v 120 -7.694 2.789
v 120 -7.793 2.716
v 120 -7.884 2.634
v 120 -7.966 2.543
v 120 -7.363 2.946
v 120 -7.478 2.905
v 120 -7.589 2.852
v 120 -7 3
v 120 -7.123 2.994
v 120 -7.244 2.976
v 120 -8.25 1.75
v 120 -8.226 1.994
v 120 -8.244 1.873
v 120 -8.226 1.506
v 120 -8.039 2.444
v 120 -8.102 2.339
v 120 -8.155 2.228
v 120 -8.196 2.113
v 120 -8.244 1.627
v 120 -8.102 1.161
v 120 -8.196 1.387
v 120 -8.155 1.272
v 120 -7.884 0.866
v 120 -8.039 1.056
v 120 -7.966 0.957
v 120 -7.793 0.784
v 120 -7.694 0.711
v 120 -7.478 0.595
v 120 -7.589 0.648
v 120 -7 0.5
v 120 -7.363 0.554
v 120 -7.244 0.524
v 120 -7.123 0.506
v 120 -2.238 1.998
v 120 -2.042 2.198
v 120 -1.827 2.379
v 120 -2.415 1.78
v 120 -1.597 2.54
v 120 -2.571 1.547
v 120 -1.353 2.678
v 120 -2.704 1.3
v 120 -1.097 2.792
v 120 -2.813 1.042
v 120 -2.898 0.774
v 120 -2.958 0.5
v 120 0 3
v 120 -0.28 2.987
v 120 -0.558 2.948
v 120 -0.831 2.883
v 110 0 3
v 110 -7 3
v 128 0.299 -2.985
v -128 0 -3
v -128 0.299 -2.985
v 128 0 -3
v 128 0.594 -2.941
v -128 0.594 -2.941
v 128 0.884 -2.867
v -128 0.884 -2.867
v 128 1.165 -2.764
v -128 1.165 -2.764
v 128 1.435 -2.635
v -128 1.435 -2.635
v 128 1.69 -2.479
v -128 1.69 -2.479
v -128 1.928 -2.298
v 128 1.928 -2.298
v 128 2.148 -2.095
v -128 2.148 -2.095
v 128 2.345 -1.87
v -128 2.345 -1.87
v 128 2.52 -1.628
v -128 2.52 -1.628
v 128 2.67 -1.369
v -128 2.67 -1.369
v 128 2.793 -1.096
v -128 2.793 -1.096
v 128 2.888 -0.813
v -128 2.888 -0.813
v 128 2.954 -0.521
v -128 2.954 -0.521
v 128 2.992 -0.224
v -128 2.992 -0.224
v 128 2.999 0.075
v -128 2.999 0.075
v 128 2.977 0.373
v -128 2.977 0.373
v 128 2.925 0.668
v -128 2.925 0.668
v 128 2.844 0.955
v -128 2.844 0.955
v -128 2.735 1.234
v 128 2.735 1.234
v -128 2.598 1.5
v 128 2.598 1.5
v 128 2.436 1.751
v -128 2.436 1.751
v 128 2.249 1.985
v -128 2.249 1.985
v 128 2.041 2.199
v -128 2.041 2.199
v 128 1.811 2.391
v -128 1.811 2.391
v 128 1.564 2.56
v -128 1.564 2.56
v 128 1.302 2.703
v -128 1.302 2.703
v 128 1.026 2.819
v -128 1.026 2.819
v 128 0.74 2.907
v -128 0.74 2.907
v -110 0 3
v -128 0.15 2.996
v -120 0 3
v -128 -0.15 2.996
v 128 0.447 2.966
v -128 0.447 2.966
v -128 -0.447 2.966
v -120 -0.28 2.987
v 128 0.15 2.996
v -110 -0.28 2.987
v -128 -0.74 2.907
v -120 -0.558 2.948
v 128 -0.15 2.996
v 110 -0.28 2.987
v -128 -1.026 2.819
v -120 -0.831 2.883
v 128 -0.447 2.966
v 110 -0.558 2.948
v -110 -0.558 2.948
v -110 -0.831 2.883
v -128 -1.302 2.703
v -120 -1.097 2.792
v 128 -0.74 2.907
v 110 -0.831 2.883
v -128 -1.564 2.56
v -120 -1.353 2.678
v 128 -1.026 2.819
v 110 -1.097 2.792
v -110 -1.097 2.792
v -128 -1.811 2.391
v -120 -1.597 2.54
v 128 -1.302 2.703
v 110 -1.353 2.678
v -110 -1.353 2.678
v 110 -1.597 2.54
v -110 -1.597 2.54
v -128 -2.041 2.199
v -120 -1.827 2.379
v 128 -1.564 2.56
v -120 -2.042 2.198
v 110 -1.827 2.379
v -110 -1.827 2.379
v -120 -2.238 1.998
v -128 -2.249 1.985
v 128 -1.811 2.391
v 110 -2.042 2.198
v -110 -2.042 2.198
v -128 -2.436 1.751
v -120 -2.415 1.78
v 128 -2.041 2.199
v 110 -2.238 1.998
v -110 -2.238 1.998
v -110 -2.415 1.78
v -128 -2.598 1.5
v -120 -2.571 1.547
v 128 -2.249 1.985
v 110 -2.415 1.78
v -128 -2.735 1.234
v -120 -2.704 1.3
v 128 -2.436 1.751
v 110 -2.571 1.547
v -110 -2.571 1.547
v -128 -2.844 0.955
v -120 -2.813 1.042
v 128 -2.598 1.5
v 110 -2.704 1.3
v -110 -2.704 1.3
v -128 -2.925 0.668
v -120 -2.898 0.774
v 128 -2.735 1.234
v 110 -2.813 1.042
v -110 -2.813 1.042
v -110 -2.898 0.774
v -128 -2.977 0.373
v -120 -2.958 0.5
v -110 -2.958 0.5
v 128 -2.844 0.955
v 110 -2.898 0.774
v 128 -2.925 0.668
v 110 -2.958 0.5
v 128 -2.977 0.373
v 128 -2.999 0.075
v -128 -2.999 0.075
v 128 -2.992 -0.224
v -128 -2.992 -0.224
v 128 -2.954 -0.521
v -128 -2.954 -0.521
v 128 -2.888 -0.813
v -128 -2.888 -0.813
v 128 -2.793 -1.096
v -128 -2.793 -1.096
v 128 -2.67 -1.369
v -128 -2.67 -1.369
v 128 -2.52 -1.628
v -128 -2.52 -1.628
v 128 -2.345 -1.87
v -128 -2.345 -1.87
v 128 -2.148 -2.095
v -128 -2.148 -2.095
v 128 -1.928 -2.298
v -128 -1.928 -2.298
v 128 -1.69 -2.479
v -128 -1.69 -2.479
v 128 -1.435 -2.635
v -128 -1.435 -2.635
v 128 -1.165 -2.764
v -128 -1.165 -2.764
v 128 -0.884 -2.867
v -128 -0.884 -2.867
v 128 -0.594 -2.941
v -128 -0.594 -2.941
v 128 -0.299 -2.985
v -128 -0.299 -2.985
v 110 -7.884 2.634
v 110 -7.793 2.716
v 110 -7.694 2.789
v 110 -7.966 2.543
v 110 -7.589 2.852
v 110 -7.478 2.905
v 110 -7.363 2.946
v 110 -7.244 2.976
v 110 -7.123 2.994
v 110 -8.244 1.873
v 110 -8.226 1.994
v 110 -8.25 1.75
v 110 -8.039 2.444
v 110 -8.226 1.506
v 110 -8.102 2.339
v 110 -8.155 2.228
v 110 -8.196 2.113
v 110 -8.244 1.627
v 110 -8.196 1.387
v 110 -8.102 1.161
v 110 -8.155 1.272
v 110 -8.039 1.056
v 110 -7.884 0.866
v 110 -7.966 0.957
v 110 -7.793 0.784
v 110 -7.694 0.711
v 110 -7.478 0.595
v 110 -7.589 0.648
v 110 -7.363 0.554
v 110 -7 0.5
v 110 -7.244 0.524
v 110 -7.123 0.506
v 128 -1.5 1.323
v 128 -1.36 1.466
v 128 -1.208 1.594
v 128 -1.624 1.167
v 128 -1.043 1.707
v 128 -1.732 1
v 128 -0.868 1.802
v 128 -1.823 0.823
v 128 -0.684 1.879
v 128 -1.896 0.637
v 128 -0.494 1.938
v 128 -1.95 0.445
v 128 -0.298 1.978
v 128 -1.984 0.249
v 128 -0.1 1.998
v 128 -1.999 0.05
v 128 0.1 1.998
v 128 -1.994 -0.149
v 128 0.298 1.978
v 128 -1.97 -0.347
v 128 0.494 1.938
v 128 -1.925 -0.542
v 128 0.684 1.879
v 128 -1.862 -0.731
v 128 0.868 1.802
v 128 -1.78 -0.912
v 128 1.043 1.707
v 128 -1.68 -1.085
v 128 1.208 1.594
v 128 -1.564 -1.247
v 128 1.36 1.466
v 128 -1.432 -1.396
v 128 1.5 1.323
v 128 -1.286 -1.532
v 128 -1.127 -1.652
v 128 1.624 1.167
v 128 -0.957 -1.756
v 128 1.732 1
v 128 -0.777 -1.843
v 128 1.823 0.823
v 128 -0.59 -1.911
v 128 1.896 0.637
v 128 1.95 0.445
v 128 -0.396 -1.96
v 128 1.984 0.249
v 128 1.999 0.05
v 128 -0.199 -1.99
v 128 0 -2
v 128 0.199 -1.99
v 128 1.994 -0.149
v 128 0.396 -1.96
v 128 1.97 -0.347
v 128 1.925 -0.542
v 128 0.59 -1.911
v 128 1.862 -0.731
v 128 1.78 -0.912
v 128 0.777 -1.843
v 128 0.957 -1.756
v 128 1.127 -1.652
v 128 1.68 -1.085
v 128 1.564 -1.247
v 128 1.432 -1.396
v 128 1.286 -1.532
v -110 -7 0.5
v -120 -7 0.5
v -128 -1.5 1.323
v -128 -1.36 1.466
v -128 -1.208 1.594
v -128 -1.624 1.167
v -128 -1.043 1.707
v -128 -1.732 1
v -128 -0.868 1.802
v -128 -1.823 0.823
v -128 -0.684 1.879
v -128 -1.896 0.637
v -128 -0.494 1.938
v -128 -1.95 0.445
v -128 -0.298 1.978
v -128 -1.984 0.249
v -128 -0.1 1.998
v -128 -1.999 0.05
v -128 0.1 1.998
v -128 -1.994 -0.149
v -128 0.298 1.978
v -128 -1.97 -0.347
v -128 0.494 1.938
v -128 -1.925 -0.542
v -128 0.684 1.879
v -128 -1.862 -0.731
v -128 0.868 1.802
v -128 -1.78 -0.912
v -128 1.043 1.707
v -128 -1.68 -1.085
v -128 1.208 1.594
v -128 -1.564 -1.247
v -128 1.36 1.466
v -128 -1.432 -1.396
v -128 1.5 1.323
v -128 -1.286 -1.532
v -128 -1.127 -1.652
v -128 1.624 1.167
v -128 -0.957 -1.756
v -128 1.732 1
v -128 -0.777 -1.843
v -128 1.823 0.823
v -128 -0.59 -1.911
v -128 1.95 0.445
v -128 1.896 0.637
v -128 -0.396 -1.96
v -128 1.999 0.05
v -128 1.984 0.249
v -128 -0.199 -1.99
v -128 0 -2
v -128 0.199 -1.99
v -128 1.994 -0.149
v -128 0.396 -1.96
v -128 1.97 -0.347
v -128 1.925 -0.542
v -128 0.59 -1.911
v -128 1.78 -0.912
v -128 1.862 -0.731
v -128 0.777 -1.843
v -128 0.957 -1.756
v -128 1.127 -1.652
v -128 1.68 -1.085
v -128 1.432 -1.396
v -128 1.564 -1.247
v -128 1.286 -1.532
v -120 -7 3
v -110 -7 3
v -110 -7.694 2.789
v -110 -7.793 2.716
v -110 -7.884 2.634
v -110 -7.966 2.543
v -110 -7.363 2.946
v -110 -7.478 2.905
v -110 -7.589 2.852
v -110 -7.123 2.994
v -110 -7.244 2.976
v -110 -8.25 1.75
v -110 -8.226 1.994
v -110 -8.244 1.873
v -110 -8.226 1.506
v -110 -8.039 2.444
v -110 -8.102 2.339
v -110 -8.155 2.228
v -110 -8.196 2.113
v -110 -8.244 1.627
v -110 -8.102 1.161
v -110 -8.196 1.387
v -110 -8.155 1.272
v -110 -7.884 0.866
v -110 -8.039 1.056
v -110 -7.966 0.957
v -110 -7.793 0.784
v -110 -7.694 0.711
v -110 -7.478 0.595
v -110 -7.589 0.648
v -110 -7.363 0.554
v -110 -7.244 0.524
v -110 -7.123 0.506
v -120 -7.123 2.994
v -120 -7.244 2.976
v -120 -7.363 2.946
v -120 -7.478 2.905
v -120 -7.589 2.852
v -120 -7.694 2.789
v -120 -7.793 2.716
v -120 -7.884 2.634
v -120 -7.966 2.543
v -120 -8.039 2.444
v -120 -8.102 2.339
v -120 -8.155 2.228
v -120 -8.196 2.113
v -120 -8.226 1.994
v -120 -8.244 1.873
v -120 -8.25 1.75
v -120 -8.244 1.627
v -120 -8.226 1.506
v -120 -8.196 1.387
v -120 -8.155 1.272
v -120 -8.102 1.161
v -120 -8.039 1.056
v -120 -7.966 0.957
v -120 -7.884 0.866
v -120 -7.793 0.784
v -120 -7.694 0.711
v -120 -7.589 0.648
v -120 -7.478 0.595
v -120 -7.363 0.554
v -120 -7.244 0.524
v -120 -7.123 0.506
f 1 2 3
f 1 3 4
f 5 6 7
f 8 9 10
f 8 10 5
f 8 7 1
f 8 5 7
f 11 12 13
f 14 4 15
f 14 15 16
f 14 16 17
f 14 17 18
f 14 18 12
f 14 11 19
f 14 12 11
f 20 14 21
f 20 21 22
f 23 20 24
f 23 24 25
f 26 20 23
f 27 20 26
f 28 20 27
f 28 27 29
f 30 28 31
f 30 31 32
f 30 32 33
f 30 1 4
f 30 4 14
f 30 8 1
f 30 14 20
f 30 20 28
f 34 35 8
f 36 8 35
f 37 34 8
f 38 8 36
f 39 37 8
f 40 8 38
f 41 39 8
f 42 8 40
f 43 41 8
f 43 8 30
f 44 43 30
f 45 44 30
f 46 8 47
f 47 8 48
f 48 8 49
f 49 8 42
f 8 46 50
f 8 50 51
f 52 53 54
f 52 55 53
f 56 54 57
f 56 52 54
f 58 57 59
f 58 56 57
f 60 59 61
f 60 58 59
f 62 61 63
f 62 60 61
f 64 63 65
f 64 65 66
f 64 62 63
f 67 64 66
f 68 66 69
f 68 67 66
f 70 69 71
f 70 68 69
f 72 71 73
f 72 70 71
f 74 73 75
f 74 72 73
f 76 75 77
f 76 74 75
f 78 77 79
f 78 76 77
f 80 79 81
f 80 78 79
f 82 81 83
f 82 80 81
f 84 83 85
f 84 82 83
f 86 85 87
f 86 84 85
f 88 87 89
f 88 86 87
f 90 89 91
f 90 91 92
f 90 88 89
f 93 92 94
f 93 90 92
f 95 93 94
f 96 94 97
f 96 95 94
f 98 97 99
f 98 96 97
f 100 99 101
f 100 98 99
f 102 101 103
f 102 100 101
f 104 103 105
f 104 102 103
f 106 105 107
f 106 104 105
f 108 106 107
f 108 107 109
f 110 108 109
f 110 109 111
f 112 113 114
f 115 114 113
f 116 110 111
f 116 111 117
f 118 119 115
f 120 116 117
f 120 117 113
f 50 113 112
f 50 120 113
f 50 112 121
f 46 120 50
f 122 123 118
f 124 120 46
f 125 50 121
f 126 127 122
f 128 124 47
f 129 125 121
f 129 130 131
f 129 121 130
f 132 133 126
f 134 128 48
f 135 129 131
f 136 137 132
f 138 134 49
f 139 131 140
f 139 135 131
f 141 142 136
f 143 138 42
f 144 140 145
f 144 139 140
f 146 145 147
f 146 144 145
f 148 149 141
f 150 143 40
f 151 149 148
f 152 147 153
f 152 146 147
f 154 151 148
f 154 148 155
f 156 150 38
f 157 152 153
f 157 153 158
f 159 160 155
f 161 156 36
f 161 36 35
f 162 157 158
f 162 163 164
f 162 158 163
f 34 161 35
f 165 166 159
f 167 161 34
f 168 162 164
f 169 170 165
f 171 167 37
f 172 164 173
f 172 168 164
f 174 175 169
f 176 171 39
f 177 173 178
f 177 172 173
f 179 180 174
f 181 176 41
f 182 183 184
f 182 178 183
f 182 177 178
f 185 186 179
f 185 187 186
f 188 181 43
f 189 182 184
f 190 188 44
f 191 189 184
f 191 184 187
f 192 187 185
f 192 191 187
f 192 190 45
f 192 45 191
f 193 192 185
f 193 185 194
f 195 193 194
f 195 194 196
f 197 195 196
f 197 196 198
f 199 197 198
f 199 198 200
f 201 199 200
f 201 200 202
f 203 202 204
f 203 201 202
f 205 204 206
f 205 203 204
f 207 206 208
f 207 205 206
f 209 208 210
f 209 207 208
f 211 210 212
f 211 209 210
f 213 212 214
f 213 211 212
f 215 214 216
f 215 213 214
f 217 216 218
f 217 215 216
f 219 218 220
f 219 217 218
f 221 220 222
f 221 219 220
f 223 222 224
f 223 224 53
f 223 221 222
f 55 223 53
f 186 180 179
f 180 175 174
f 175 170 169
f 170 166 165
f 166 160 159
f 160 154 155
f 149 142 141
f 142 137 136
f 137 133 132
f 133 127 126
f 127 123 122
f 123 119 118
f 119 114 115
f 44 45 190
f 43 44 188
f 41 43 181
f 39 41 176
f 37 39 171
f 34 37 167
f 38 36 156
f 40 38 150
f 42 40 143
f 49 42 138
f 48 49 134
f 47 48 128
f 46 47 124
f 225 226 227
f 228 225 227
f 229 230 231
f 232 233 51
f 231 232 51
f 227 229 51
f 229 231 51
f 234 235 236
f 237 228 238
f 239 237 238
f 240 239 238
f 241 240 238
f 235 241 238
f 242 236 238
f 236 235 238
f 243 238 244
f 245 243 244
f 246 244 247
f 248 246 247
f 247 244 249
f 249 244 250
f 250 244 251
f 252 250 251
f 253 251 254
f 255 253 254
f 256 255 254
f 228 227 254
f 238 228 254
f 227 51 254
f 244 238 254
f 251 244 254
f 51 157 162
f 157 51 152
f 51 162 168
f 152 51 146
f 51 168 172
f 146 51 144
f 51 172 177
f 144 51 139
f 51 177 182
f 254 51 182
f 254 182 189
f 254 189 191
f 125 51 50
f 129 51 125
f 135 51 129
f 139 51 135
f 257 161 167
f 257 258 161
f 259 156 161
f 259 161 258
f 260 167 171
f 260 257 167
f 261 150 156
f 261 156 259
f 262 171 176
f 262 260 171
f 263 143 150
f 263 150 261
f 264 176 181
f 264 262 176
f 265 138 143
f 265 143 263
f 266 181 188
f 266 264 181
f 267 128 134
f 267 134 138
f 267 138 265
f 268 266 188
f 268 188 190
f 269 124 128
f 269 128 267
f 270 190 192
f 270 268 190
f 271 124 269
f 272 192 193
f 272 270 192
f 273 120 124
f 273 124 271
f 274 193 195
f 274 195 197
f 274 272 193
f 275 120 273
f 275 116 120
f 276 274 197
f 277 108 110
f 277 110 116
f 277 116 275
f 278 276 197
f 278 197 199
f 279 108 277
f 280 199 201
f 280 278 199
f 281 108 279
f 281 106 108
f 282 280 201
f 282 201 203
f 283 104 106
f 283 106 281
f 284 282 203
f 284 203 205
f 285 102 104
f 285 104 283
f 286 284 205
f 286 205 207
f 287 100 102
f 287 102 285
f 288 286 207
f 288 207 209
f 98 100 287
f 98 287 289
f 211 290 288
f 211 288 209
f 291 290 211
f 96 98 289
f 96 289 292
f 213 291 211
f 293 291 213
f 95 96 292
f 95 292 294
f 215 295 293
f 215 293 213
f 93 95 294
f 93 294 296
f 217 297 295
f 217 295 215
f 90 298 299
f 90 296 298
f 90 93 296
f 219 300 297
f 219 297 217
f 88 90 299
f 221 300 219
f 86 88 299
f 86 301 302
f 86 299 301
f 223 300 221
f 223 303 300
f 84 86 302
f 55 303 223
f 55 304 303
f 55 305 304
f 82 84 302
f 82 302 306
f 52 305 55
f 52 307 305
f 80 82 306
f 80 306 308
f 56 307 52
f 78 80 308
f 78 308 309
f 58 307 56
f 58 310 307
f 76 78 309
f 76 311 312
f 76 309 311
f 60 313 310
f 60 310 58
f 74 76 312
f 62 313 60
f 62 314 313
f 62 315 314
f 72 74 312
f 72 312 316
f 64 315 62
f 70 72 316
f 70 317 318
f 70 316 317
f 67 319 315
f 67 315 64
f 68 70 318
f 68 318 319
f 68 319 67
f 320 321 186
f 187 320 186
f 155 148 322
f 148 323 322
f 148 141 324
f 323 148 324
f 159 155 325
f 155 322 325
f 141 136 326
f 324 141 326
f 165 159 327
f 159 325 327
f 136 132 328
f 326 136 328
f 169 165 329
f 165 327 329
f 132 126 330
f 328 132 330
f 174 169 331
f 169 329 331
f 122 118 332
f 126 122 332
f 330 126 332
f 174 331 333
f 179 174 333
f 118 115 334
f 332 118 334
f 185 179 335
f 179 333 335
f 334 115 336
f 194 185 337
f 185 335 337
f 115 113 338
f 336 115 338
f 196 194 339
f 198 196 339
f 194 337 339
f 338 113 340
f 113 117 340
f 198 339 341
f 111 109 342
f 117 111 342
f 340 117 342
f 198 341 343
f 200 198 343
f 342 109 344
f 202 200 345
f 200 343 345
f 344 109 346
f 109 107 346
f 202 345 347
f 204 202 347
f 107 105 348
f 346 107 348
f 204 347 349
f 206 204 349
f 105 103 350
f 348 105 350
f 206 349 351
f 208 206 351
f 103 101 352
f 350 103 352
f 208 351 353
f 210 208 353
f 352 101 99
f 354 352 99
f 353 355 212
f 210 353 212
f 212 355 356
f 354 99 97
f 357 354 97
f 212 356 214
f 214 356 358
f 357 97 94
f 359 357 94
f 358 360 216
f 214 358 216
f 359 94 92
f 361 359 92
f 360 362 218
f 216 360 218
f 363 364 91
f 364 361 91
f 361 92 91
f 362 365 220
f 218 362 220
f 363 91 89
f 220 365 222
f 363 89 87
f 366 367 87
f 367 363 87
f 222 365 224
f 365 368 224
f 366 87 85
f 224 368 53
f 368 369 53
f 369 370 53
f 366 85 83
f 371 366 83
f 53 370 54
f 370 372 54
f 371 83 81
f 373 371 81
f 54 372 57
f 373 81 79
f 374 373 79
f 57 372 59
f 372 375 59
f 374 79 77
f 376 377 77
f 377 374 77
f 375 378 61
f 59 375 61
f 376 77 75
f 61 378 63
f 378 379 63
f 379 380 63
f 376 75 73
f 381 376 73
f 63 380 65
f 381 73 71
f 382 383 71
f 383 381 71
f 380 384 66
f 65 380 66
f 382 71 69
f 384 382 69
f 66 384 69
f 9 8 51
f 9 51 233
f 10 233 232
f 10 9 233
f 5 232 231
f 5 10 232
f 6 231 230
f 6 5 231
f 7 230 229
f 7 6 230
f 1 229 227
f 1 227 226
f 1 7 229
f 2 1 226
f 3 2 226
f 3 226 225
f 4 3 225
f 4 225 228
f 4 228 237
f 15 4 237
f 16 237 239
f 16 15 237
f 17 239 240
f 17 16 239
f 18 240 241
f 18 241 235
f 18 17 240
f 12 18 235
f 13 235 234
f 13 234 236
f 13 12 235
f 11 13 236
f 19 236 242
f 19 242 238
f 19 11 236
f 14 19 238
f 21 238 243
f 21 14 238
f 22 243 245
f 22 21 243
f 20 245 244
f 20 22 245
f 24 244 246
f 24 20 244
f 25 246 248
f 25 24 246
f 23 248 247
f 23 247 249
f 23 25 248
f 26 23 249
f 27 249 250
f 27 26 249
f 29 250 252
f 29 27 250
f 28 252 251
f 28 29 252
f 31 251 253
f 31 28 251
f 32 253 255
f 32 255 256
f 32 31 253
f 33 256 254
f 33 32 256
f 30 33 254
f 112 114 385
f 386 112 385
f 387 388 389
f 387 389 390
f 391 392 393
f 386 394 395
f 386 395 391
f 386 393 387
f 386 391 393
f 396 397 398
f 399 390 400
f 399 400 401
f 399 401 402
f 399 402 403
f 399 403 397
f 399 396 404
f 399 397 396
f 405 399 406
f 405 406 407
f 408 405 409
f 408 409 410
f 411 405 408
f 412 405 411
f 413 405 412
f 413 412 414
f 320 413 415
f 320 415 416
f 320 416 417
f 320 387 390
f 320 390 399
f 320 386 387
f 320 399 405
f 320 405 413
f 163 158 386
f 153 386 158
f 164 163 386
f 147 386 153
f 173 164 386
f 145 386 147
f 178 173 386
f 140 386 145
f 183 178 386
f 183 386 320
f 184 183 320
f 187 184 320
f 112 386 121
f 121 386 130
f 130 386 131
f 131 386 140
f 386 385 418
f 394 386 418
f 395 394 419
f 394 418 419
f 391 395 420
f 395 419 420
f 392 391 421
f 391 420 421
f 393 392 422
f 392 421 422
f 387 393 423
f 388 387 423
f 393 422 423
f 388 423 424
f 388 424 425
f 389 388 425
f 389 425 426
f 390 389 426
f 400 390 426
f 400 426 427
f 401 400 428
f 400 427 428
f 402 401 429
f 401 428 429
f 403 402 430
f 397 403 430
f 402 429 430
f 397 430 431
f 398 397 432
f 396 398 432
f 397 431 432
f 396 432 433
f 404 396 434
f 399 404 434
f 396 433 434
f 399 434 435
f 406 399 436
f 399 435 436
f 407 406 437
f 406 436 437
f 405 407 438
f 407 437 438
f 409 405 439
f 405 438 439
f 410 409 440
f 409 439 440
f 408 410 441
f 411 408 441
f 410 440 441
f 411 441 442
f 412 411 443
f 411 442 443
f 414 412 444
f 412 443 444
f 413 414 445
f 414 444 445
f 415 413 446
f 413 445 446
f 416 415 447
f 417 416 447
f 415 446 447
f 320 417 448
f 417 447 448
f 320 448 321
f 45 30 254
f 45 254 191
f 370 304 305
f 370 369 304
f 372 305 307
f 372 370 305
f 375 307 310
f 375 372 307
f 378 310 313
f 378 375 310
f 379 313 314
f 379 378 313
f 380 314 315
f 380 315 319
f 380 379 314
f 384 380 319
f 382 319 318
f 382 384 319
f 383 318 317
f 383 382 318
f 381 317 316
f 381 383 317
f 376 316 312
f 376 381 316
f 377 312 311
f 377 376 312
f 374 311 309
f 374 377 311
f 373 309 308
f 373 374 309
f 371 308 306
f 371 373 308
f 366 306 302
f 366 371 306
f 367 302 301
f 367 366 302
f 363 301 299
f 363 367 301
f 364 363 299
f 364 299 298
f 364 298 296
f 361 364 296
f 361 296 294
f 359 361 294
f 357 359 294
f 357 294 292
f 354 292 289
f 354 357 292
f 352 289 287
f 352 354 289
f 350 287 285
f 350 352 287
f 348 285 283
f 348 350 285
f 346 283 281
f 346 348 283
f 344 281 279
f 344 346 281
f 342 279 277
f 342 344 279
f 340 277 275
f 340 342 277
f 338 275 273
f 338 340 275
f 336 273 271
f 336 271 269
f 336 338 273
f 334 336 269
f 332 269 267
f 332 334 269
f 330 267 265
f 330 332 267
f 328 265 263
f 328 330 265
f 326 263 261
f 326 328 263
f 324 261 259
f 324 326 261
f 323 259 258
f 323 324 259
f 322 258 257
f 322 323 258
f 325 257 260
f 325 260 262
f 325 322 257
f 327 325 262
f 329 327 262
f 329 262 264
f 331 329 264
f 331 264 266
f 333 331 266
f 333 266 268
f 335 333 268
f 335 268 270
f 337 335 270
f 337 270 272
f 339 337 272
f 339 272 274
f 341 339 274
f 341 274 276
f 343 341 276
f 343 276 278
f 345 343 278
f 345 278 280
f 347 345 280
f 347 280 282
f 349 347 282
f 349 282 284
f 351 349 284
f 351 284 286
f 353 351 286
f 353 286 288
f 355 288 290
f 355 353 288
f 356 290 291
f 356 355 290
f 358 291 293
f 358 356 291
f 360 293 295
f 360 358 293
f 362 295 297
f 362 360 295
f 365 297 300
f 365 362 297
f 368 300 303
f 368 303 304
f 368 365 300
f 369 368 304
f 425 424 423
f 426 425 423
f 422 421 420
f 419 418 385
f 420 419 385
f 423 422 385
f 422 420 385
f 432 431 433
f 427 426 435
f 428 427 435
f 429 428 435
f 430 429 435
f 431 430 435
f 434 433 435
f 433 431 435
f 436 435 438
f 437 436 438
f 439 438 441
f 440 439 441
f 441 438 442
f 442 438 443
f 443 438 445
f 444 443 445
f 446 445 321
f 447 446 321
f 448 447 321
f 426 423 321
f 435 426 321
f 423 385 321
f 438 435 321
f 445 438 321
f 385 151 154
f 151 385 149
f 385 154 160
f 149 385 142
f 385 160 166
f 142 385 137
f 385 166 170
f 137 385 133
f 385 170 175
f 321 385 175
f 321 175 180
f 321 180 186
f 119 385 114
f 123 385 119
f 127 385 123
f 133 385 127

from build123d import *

# Parameters (mm, degrees)
SKETCH_1_R      = 3
SKETCH_1_R_2    = 2
EXTRUDE_1_DEPTH = 128
EXTRUDE_START   = 10
EXTRUDE_2_DEPTH = 10


with BuildPart() as part:
    # 草圖1 → 填料-伸長1 (new, symmetric)
    with BuildSketch(Plane(origin=(0, 0, 0), x_dir=(0, 0, -1), z_dir=(1, 0, 0))):
        Circle(SKETCH_1_R)
        Circle(SKETCH_1_R_2, mode=Mode.SUBTRACT)
    extrude(amount=EXTRUDE_1_DEPTH, both=True)

    # 草圖2 → 填料-伸長2 (add)
    with BuildSketch(Plane(origin=(110, 0, 0), x_dir=(0, 0, -1), z_dir=(1, 0, 0)).offset(EXTRUDE_START)):
        with BuildLine():
            Line((-3, 0), (-3, -7))
            ThreePointArc((-3, -7), (-1.75, -8.25), (-0.5, -7))
            Line((-0.5, -7), (-0.5, -2.958039892))
            ThreePointArc((-0.5, -2.958039892), (-2.291287847, -1.936491673), (-3, 0))
        make_face()
    extrude_2 = extrude(amount=-EXTRUDE_2_DEPTH)

    # 鏡射1: 填料-伸長2 across plane
    add(extrude_2.mirror(Plane(origin=(0, 0, 0), x_dir=(0, 0, 1), z_dir=(1, 0, 0))))


solid = part.part
